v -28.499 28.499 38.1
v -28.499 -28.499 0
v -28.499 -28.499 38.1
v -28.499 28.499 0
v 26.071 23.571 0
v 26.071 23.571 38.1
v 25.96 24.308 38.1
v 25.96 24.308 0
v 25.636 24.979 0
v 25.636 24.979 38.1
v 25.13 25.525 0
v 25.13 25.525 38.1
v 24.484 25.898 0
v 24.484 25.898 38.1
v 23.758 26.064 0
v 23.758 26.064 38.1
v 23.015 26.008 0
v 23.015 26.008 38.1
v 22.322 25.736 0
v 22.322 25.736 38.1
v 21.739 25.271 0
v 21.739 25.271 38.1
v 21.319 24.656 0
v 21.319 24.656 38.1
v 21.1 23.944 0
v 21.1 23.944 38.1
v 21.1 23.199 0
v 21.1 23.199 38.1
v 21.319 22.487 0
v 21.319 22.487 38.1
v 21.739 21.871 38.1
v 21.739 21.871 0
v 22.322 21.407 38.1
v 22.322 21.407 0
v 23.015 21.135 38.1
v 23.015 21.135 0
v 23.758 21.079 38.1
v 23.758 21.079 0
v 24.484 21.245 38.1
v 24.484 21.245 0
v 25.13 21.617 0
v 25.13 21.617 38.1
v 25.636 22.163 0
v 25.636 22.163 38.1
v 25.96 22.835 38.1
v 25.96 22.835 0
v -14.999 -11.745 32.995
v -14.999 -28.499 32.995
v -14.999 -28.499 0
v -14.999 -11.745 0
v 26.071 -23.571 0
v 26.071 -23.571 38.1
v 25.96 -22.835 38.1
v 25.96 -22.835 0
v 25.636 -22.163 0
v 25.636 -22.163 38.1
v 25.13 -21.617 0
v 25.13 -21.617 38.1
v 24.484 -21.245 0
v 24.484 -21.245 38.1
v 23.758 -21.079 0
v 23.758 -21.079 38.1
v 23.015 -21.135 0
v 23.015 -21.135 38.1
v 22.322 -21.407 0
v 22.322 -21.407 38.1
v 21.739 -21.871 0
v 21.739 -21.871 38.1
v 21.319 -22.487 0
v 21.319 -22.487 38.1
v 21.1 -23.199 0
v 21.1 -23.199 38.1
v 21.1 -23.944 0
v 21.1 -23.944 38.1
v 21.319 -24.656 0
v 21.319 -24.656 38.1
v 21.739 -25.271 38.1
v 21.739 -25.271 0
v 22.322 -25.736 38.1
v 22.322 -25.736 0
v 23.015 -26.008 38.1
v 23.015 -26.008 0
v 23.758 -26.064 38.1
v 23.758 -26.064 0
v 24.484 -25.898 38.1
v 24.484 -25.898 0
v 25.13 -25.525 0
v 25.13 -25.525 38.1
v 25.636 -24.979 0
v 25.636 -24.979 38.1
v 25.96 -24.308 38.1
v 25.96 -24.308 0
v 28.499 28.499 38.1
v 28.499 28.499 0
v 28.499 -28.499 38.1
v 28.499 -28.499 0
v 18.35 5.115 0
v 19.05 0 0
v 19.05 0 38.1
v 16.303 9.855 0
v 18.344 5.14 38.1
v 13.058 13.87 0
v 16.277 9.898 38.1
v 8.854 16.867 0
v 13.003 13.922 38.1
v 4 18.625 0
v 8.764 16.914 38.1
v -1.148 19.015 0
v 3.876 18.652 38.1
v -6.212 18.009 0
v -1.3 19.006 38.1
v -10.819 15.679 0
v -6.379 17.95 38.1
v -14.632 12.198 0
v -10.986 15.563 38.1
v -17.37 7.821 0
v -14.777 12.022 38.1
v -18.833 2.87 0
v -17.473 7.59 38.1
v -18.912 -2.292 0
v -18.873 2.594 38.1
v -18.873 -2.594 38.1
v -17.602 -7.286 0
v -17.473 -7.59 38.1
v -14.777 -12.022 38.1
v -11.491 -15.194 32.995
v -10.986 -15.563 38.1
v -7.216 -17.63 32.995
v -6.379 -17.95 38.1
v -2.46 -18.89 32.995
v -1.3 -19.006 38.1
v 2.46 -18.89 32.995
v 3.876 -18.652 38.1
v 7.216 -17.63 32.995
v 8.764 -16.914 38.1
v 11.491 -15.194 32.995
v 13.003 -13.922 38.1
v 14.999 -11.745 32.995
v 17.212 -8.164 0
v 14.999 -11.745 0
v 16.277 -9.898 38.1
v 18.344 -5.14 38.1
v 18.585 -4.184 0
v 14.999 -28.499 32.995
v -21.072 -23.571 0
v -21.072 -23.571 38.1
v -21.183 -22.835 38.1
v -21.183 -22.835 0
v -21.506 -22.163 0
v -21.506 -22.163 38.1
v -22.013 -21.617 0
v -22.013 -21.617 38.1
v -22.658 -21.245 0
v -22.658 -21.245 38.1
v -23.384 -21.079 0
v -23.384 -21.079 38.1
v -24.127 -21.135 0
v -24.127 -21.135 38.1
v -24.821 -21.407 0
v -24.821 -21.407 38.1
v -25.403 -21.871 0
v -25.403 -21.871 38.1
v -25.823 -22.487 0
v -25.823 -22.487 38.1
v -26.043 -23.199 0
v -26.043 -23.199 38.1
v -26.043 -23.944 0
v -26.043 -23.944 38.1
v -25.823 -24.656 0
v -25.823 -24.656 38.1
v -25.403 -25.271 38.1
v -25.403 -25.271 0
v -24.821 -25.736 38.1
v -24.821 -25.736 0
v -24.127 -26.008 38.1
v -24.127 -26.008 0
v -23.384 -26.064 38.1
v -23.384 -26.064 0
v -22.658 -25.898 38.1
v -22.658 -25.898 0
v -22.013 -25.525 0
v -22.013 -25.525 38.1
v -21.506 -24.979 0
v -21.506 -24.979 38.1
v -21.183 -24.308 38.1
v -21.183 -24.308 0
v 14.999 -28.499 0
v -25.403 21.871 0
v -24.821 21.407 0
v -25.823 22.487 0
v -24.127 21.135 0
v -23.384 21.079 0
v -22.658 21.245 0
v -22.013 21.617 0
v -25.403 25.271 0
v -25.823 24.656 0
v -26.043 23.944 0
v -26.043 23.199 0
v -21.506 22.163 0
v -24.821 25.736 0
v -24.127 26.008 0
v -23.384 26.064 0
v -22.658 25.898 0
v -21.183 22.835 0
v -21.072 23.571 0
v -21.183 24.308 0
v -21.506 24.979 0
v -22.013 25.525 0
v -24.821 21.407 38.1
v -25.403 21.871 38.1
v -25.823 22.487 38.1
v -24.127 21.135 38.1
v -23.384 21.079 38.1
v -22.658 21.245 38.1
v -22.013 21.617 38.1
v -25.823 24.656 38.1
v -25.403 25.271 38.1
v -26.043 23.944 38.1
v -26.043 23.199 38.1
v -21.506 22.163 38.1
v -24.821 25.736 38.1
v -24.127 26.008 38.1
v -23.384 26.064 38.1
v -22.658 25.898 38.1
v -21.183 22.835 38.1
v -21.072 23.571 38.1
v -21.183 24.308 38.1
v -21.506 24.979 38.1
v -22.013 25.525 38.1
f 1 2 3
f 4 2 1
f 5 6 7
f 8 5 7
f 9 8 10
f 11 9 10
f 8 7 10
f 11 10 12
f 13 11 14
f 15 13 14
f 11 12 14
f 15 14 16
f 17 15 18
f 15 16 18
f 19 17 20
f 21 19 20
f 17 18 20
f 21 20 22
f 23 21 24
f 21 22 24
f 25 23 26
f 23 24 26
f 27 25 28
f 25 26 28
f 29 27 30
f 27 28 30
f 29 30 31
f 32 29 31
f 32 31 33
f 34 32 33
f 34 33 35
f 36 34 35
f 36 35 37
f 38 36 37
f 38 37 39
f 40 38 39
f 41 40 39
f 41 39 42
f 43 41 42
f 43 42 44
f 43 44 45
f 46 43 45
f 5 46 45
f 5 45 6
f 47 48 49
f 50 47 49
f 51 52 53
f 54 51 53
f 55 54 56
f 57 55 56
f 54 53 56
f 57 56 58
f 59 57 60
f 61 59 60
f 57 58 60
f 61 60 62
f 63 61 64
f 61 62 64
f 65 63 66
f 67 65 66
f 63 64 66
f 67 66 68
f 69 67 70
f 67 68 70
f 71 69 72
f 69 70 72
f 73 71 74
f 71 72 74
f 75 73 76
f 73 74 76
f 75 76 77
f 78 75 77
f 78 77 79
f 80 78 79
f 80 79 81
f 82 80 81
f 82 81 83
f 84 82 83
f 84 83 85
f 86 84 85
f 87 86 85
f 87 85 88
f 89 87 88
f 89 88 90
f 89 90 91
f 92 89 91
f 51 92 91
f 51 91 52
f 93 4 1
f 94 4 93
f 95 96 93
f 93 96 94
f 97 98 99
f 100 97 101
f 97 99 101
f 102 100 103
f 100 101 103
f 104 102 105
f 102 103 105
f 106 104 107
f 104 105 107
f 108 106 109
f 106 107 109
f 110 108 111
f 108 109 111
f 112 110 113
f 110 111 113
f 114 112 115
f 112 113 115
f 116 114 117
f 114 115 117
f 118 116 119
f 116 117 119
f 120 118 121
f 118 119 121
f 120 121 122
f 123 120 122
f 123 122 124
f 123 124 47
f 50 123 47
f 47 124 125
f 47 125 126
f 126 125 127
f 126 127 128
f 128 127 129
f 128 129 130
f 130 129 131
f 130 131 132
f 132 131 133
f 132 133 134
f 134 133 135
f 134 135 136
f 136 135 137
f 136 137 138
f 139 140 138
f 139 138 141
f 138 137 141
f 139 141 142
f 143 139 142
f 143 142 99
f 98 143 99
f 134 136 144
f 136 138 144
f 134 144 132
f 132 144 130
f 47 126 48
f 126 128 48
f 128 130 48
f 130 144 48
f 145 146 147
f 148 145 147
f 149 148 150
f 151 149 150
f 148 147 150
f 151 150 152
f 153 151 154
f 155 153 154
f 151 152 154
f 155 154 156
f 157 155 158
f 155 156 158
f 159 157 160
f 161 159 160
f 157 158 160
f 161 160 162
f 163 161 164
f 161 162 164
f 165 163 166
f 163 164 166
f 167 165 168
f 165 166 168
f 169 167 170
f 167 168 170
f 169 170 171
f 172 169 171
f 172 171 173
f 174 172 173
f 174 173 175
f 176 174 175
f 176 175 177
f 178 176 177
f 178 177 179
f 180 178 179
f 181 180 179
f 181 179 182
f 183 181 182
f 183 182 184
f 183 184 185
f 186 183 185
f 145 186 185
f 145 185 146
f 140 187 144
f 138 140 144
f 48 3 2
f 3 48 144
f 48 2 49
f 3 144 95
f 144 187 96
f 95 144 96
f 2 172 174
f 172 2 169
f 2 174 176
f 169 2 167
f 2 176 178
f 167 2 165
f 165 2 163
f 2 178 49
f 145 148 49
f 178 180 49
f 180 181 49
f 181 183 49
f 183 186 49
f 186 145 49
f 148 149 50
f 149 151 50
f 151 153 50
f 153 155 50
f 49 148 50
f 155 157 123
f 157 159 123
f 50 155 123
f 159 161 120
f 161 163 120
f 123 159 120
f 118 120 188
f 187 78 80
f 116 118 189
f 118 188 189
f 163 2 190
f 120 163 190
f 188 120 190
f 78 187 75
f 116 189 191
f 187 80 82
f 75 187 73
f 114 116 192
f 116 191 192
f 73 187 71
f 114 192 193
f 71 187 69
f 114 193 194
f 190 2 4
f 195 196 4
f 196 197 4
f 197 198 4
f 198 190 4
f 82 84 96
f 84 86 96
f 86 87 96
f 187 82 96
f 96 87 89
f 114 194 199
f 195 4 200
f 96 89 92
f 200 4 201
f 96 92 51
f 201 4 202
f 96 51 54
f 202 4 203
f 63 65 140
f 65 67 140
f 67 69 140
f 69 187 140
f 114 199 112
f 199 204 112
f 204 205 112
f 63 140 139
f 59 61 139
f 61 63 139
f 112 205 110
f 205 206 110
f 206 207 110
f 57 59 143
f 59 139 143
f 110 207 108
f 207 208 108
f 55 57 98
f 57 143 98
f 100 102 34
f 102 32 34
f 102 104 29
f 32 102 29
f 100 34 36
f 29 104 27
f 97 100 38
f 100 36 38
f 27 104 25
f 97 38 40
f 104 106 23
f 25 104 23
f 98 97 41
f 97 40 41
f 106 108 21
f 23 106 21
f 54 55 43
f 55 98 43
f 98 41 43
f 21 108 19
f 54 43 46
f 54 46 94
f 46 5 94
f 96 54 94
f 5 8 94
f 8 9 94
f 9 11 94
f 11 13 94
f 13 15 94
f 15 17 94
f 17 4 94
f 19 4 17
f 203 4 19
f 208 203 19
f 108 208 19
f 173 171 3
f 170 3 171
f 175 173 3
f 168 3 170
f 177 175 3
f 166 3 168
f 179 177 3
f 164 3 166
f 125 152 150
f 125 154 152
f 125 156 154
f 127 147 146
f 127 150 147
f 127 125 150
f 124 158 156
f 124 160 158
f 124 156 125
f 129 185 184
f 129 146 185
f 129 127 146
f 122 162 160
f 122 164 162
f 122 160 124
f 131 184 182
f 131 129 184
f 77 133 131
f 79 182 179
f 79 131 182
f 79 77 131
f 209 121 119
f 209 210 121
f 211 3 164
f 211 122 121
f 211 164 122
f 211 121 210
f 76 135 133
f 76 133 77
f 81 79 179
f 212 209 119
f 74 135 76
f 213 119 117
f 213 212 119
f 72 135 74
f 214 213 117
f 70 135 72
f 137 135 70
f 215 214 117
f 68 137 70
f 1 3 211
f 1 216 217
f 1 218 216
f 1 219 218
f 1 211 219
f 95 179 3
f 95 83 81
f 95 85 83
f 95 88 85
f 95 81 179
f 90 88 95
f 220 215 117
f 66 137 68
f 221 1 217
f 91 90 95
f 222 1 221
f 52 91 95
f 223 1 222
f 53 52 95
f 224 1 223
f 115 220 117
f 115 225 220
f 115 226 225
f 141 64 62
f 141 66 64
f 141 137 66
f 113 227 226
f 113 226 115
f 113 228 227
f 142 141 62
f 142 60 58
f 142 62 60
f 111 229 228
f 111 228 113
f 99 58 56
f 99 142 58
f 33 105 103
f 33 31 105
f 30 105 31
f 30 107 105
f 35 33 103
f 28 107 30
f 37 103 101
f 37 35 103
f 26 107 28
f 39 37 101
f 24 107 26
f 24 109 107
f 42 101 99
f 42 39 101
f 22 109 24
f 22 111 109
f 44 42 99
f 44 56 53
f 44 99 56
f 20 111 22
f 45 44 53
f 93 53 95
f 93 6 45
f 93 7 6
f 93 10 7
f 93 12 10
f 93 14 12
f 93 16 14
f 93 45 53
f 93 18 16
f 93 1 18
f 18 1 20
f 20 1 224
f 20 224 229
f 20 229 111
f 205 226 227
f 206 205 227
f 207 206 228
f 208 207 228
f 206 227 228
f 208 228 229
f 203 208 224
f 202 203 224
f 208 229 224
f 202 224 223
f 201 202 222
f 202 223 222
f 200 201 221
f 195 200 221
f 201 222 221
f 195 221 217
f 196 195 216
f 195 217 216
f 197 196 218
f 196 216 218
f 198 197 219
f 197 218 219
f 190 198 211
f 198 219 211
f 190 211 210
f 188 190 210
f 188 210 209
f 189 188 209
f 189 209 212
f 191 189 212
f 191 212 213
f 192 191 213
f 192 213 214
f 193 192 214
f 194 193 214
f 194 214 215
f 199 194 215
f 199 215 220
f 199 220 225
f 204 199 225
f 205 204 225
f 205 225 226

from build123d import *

# Parameters (mm, degrees)
F0_W     = 56.9976
F0_H     = 56.9976
F1_DEPTH = 38.1
F3_DEPTH = 28.4988
F4_R     = 19.05
F5_DEPTH = 38.101
F6_R     = 2.49936
F7_DEPTH = 38.101


with BuildPart() as f1:
    # F0 (on Top) → F1 (new body)
    with BuildSketch(Plane.XY):
        Rectangle(F0_W, F0_H)
    extrude(amount=F1_DEPTH)

    # F2 (on face) → F3 (cut)
    with BuildSketch(Plane.XZ.offset(28.4988)):
        Polygon((-14.9987, 0), (0, 0), (14.9987, 0), (14.9987, 32.9946), (-14.9987, 32.9946), align=None)
    extrude(amount=-F3_DEPTH, mode=Mode.SUBTRACT)

    # F4 (on face) → F5 (cut, through all)
    with BuildSketch(Plane.XY.offset(38.1)):
        Circle(F4_R)
    extrude(amount=-F5_DEPTH, mode=Mode.SUBTRACT)

    # F6 (on face) → F7 (cut, through all)
    with BuildSketch(Plane.XY.offset(38.1)):
        with Locations((-23.5712, 23.5712)):
            Circle(F6_R)
        with Locations((23.5712, 23.5712)):
            Circle(F6_R)
        with Locations((23.5712, -23.5712)):
            Circle(F6_R)
        with Locations((-23.5712, -23.5712)):
            Circle(F6_R)
    extrude(amount=-F7_DEPTH, mode=Mode.SUBTRACT)


solid = f1.part
